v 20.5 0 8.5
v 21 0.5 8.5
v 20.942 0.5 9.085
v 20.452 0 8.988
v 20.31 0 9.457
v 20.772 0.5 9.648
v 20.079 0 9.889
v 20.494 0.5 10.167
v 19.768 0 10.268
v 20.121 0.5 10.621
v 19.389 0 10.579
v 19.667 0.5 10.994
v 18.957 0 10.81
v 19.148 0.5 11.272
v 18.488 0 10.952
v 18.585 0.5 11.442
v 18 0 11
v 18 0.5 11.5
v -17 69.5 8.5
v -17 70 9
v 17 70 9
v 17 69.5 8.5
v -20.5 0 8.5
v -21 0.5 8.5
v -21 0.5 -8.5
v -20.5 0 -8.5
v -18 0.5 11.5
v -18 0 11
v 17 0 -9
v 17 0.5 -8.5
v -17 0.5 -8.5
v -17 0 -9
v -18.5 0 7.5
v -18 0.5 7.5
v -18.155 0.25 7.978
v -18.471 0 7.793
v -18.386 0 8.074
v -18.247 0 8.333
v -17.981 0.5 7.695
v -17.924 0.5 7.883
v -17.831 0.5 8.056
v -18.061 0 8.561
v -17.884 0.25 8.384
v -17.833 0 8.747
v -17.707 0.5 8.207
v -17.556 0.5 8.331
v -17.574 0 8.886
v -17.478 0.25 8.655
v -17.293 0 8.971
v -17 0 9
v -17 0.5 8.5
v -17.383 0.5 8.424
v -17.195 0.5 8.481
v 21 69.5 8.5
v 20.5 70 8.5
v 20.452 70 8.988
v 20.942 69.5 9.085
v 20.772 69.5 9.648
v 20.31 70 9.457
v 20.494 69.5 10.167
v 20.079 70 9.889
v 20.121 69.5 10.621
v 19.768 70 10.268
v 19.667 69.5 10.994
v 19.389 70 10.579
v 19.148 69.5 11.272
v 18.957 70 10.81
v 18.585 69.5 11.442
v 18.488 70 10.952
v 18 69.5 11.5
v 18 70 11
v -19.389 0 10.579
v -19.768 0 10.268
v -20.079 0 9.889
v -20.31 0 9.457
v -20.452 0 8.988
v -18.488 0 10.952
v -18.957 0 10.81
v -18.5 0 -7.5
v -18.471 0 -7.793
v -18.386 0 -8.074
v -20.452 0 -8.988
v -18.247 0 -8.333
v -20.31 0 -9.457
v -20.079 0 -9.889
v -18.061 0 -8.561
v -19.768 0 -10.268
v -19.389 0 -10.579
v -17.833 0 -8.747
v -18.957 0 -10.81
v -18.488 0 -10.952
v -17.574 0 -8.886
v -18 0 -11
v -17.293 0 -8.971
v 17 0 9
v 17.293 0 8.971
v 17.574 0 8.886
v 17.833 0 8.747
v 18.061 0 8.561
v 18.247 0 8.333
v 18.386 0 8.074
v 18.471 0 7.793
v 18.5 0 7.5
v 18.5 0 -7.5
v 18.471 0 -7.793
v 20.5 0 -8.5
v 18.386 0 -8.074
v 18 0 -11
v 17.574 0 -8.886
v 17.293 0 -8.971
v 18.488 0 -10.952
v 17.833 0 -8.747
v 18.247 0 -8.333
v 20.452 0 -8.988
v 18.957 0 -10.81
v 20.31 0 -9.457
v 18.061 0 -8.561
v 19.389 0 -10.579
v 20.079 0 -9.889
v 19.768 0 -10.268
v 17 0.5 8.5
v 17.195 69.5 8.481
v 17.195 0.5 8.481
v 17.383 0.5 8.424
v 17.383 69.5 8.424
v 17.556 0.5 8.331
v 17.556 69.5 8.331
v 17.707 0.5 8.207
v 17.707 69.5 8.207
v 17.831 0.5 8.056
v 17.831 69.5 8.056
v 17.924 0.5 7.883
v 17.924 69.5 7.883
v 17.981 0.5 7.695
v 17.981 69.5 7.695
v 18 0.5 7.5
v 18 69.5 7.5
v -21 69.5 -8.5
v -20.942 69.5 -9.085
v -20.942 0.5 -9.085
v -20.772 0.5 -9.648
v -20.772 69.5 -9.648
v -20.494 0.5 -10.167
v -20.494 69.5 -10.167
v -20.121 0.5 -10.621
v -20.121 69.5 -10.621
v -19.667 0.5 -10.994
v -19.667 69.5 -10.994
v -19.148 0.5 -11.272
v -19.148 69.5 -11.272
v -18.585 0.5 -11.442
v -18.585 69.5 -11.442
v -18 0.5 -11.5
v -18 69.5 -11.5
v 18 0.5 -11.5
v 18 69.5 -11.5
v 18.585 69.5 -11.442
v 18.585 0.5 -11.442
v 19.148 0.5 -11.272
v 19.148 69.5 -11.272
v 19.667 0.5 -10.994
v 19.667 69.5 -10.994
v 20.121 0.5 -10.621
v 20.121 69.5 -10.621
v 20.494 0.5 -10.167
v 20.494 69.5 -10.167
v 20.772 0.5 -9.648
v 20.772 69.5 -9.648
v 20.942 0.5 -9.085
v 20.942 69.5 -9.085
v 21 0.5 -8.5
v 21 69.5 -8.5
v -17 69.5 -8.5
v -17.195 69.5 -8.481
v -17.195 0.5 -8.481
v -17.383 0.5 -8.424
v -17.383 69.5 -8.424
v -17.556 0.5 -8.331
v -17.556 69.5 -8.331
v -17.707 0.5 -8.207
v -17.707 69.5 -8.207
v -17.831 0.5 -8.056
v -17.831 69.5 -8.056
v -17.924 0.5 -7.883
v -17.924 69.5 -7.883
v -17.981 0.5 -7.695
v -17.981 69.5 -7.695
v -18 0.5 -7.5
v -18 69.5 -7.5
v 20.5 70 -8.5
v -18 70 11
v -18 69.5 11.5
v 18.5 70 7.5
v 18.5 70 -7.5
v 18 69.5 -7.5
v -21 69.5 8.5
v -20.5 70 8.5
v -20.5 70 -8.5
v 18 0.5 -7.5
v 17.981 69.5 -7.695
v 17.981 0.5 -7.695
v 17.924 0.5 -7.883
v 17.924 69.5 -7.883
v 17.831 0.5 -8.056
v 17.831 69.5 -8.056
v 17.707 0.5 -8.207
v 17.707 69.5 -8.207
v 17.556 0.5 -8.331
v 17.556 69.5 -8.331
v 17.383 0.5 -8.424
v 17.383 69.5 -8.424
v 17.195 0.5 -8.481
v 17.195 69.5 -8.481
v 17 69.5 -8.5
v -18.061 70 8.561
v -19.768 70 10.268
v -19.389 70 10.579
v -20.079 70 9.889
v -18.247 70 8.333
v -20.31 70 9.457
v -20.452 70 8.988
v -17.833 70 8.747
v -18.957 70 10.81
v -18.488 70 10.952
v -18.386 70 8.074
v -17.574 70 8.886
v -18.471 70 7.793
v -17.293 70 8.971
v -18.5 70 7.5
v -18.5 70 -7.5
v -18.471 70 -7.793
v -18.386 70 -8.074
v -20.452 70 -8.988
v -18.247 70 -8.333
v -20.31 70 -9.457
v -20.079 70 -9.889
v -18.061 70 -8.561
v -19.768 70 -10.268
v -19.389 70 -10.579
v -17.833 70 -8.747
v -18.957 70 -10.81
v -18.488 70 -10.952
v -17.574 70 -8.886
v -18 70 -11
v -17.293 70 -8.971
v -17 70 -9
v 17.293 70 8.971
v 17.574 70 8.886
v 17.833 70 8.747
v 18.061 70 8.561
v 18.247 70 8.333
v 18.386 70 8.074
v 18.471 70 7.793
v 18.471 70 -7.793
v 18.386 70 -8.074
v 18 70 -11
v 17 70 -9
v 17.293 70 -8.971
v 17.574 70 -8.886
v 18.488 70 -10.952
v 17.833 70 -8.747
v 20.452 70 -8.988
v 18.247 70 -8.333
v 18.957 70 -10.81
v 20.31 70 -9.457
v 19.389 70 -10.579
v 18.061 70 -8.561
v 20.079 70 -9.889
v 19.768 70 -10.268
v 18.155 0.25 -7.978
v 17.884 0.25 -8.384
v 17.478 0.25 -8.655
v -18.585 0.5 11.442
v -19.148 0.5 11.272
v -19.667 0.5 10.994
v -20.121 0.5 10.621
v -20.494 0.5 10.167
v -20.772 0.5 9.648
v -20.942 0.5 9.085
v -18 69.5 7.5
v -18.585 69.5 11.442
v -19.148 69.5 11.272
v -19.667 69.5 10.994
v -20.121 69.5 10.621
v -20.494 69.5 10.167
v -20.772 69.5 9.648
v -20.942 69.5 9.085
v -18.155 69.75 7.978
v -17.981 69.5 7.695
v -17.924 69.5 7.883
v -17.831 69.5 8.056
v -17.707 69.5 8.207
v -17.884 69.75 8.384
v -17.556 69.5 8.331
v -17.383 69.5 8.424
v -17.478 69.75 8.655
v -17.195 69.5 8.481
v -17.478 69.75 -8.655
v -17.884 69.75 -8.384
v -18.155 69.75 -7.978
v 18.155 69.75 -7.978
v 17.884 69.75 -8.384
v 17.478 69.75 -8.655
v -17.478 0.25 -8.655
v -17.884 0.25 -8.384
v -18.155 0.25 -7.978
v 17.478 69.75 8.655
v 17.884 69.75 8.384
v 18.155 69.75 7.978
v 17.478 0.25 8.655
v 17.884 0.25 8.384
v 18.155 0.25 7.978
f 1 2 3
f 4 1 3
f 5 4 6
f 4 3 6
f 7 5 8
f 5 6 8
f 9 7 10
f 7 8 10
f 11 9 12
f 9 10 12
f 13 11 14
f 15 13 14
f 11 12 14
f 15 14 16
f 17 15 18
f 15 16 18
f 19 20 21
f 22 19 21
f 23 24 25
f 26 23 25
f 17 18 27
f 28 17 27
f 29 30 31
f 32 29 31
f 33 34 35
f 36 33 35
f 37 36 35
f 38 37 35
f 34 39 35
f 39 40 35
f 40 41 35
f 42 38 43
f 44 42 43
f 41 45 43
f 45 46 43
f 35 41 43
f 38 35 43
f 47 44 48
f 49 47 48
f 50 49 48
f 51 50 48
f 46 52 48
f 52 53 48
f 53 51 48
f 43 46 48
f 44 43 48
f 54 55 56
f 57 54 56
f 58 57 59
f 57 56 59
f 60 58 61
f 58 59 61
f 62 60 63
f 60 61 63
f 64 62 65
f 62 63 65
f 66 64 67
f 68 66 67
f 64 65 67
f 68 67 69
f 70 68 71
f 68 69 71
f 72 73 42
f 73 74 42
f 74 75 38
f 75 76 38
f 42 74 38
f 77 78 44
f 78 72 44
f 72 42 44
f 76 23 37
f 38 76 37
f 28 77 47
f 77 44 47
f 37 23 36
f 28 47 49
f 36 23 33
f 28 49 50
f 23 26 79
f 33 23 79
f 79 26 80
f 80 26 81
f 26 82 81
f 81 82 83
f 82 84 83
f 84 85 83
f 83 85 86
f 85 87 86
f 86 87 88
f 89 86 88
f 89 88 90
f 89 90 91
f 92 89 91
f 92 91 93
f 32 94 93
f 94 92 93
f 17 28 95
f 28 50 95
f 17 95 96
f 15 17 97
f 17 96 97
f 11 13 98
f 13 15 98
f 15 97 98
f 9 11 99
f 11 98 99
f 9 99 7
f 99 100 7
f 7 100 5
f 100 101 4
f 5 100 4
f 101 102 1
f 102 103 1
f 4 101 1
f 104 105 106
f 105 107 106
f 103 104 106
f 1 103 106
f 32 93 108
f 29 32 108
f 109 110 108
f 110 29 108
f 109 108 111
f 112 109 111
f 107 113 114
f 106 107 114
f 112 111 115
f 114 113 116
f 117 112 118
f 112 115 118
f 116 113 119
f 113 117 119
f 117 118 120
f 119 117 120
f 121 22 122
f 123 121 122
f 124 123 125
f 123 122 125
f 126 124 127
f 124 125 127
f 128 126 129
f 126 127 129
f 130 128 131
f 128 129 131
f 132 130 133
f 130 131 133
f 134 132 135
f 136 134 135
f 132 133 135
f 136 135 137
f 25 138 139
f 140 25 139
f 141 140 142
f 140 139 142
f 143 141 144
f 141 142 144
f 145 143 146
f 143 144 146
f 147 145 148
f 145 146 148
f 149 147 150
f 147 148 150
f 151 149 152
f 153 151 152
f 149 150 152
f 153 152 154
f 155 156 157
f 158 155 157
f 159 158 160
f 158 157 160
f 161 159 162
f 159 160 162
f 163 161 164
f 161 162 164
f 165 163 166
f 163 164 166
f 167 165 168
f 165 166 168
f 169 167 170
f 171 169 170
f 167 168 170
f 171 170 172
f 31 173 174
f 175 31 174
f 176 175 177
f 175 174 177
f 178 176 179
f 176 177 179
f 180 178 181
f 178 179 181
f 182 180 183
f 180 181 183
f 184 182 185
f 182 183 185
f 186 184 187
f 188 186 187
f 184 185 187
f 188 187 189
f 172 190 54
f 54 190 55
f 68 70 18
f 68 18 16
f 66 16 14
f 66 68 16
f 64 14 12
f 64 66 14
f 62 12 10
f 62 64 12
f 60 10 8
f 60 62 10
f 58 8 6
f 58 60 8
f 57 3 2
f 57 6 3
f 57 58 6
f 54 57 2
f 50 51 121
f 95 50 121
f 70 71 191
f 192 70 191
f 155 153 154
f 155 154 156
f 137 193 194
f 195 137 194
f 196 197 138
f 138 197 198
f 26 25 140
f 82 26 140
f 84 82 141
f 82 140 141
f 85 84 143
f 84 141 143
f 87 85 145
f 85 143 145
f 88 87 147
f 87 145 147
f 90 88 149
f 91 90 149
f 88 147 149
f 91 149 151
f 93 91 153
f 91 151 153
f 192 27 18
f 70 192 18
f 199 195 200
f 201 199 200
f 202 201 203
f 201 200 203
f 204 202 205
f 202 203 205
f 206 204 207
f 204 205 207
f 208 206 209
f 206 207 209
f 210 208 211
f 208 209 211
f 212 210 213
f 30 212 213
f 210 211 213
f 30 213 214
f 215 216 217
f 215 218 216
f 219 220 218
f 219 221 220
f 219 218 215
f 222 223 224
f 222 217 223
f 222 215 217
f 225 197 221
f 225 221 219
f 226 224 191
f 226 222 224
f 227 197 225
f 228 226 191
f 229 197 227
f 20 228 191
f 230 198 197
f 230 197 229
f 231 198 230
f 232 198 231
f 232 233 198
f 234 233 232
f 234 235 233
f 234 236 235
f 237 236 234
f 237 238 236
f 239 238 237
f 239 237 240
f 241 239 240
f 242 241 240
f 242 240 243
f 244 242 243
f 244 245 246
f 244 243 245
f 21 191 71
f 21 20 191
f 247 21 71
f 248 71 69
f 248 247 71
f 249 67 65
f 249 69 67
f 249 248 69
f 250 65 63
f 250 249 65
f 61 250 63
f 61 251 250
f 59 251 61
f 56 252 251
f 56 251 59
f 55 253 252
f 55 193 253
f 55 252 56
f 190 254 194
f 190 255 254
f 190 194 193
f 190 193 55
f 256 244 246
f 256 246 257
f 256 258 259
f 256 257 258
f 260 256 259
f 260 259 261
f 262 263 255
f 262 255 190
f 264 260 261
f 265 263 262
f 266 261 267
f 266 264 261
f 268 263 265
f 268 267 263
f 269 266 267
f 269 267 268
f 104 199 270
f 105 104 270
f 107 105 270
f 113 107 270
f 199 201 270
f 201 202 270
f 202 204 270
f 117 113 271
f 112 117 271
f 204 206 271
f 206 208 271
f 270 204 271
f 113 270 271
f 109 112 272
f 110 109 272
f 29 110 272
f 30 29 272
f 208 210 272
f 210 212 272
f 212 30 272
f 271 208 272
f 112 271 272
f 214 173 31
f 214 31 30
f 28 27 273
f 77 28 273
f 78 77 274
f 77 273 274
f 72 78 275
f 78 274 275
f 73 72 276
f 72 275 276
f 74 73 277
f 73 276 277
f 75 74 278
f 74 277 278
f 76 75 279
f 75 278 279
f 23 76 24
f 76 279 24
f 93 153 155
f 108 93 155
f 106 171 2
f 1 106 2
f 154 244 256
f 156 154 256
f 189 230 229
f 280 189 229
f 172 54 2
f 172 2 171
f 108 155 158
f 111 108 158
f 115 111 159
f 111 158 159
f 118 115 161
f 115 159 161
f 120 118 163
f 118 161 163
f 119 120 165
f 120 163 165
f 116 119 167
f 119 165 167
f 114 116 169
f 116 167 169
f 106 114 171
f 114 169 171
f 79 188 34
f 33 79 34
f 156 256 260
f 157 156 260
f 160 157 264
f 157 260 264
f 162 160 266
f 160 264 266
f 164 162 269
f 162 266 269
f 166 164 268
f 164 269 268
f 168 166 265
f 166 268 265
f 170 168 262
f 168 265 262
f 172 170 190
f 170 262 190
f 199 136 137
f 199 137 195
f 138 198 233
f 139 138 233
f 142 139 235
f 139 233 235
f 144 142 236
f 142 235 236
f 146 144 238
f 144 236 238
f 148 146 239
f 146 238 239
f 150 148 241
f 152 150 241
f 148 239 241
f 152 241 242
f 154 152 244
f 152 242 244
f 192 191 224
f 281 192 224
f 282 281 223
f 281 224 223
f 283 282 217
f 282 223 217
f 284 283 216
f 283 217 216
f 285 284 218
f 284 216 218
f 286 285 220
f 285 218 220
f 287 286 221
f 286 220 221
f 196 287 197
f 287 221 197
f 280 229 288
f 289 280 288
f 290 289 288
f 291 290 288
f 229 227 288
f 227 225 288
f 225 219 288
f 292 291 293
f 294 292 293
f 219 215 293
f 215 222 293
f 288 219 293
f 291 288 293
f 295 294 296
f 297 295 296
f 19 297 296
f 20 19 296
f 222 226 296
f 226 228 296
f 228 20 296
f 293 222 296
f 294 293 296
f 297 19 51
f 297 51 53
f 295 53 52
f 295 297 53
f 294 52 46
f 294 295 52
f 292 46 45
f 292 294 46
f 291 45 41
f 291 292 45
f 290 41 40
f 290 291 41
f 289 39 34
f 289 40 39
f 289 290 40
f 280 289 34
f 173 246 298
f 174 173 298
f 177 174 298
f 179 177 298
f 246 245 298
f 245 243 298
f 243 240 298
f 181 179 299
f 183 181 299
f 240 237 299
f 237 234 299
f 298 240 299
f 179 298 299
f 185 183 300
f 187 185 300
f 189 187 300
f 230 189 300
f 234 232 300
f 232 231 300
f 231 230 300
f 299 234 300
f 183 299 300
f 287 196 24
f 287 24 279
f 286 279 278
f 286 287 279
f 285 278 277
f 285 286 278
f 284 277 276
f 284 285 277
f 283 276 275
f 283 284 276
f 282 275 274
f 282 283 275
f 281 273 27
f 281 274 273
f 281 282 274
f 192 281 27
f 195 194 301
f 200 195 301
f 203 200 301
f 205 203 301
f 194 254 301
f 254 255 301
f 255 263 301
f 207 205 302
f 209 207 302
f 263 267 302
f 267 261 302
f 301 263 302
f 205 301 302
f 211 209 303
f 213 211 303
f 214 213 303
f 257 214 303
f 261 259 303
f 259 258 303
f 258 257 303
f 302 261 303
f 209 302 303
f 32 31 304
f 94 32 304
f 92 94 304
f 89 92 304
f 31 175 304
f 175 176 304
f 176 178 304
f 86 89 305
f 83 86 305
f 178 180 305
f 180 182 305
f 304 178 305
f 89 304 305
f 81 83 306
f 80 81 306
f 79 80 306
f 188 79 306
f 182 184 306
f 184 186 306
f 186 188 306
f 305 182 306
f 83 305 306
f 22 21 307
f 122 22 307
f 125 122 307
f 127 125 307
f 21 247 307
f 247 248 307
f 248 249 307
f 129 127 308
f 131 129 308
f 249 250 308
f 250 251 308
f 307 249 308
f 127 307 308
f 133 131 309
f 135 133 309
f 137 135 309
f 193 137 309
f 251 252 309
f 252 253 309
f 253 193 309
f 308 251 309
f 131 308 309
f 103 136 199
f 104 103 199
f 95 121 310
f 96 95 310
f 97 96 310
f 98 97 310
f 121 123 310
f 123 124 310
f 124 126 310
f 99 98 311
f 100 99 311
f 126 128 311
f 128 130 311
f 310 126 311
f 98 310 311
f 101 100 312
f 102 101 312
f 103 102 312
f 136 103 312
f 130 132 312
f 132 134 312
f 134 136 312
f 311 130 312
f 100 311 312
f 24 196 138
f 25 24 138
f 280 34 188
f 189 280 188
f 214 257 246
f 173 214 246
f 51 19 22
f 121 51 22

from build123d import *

# Parameters (mm, degrees)
CROQUIS1_W              = 42
CROQUIS1_H              = 23
CROQUIS1_W_2            = 36
CROQUIS1_H_2            = 17
SALIENTE_EXTRUIR1_DEPTH = 70
REDONDEO1_R             = 3
REDONDEO2_R             = 1
CHAFL_N1_SIZE           = 0.5


with BuildPart() as part:
    # Croquis1 → Saliente-Extruir1 (new body)
    with BuildSketch(Plane(origin=(0, 0, 0), x_dir=(1, 0, 0), z_dir=(0, 1, 0))):
        Rectangle(CROQUIS1_W, CROQUIS1_H)
        Rectangle(CROQUIS1_W_2, CROQUIS1_H_2, mode=Mode.SUBTRACT)
    extrude(amount=SALIENTE_EXTRUIR1_DEPTH)

    # Redondeo1
    redondeo1_edges = [part.edges().sort_by_distance(p)[0] for p in [
        (-21, 35, -11.5),
        (21, 35, -11.5),
        (21, 35, 11.5),
        (-21, 35, 11.5),
    ]]
    fillet(redondeo1_edges, radius=REDONDEO1_R)

    # Redondeo2
    redondeo2_edges = [part.edges().sort_by_distance(p)[0] for p in [
        (18, 35, 8.5),
        (18, 35, -8.5),
        (-18, 35, -8.5),
        (-18, 35, 8.5),
    ]]
    fillet(redondeo2_edges, radius=REDONDEO2_R)

    # Chaflán1
    chafl_n1_edges = [part.edges().sort_by_distance(p)[0] for p in [
        (-21, 0, 0),
        (-21, 70, 0),
        (0, 0, -11.5),
        (21, 0, 0),
        (0, 0, 11.5),
        (-20.121320344, 0, 10.621320344),
        (20.121320344, 0, 10.621320344),
        (20.121320344, 0, -10.621320344),
        (-20.121320344, 0, -10.621320344),
        (0, 70, -11.5),
        (0, 70, 11.5),
        (21, 70, 0),
        (-20.121320344, 70, 10.621320344),
        (20.121320344, 70, 10.621320344),
        (20.121320344, 70, -10.621320344),
        (-20.121320344, 70, -10.621320344),
        (0, 0, 8.5),
        (0, 70, 8.5),
        (18, 0, 0),
        (18, 70, 0),
        (0, 0, -8.5),
        (0, 70, -8.5),
        (-18, 0, 0),
        (-18, 70, 0),
        (17.707106781, 0, 8.207106781),
        (17.707106781, 70, 8.207106781),
        (17.707106781, 0, -8.207106781),
        (17.707106781, 70, -8.207106781),
        (-17.707106781, 0, -8.207106781),
        (-17.707106781, 70, -8.207106781),
        (-17.707106781, 0, 8.207106781),
        (-17.707106781, 70, 8.207106781),
    ]]
    chamfer(chafl_n1_edges, length=CHAFL_N1_SIZE)


solid = part.part
